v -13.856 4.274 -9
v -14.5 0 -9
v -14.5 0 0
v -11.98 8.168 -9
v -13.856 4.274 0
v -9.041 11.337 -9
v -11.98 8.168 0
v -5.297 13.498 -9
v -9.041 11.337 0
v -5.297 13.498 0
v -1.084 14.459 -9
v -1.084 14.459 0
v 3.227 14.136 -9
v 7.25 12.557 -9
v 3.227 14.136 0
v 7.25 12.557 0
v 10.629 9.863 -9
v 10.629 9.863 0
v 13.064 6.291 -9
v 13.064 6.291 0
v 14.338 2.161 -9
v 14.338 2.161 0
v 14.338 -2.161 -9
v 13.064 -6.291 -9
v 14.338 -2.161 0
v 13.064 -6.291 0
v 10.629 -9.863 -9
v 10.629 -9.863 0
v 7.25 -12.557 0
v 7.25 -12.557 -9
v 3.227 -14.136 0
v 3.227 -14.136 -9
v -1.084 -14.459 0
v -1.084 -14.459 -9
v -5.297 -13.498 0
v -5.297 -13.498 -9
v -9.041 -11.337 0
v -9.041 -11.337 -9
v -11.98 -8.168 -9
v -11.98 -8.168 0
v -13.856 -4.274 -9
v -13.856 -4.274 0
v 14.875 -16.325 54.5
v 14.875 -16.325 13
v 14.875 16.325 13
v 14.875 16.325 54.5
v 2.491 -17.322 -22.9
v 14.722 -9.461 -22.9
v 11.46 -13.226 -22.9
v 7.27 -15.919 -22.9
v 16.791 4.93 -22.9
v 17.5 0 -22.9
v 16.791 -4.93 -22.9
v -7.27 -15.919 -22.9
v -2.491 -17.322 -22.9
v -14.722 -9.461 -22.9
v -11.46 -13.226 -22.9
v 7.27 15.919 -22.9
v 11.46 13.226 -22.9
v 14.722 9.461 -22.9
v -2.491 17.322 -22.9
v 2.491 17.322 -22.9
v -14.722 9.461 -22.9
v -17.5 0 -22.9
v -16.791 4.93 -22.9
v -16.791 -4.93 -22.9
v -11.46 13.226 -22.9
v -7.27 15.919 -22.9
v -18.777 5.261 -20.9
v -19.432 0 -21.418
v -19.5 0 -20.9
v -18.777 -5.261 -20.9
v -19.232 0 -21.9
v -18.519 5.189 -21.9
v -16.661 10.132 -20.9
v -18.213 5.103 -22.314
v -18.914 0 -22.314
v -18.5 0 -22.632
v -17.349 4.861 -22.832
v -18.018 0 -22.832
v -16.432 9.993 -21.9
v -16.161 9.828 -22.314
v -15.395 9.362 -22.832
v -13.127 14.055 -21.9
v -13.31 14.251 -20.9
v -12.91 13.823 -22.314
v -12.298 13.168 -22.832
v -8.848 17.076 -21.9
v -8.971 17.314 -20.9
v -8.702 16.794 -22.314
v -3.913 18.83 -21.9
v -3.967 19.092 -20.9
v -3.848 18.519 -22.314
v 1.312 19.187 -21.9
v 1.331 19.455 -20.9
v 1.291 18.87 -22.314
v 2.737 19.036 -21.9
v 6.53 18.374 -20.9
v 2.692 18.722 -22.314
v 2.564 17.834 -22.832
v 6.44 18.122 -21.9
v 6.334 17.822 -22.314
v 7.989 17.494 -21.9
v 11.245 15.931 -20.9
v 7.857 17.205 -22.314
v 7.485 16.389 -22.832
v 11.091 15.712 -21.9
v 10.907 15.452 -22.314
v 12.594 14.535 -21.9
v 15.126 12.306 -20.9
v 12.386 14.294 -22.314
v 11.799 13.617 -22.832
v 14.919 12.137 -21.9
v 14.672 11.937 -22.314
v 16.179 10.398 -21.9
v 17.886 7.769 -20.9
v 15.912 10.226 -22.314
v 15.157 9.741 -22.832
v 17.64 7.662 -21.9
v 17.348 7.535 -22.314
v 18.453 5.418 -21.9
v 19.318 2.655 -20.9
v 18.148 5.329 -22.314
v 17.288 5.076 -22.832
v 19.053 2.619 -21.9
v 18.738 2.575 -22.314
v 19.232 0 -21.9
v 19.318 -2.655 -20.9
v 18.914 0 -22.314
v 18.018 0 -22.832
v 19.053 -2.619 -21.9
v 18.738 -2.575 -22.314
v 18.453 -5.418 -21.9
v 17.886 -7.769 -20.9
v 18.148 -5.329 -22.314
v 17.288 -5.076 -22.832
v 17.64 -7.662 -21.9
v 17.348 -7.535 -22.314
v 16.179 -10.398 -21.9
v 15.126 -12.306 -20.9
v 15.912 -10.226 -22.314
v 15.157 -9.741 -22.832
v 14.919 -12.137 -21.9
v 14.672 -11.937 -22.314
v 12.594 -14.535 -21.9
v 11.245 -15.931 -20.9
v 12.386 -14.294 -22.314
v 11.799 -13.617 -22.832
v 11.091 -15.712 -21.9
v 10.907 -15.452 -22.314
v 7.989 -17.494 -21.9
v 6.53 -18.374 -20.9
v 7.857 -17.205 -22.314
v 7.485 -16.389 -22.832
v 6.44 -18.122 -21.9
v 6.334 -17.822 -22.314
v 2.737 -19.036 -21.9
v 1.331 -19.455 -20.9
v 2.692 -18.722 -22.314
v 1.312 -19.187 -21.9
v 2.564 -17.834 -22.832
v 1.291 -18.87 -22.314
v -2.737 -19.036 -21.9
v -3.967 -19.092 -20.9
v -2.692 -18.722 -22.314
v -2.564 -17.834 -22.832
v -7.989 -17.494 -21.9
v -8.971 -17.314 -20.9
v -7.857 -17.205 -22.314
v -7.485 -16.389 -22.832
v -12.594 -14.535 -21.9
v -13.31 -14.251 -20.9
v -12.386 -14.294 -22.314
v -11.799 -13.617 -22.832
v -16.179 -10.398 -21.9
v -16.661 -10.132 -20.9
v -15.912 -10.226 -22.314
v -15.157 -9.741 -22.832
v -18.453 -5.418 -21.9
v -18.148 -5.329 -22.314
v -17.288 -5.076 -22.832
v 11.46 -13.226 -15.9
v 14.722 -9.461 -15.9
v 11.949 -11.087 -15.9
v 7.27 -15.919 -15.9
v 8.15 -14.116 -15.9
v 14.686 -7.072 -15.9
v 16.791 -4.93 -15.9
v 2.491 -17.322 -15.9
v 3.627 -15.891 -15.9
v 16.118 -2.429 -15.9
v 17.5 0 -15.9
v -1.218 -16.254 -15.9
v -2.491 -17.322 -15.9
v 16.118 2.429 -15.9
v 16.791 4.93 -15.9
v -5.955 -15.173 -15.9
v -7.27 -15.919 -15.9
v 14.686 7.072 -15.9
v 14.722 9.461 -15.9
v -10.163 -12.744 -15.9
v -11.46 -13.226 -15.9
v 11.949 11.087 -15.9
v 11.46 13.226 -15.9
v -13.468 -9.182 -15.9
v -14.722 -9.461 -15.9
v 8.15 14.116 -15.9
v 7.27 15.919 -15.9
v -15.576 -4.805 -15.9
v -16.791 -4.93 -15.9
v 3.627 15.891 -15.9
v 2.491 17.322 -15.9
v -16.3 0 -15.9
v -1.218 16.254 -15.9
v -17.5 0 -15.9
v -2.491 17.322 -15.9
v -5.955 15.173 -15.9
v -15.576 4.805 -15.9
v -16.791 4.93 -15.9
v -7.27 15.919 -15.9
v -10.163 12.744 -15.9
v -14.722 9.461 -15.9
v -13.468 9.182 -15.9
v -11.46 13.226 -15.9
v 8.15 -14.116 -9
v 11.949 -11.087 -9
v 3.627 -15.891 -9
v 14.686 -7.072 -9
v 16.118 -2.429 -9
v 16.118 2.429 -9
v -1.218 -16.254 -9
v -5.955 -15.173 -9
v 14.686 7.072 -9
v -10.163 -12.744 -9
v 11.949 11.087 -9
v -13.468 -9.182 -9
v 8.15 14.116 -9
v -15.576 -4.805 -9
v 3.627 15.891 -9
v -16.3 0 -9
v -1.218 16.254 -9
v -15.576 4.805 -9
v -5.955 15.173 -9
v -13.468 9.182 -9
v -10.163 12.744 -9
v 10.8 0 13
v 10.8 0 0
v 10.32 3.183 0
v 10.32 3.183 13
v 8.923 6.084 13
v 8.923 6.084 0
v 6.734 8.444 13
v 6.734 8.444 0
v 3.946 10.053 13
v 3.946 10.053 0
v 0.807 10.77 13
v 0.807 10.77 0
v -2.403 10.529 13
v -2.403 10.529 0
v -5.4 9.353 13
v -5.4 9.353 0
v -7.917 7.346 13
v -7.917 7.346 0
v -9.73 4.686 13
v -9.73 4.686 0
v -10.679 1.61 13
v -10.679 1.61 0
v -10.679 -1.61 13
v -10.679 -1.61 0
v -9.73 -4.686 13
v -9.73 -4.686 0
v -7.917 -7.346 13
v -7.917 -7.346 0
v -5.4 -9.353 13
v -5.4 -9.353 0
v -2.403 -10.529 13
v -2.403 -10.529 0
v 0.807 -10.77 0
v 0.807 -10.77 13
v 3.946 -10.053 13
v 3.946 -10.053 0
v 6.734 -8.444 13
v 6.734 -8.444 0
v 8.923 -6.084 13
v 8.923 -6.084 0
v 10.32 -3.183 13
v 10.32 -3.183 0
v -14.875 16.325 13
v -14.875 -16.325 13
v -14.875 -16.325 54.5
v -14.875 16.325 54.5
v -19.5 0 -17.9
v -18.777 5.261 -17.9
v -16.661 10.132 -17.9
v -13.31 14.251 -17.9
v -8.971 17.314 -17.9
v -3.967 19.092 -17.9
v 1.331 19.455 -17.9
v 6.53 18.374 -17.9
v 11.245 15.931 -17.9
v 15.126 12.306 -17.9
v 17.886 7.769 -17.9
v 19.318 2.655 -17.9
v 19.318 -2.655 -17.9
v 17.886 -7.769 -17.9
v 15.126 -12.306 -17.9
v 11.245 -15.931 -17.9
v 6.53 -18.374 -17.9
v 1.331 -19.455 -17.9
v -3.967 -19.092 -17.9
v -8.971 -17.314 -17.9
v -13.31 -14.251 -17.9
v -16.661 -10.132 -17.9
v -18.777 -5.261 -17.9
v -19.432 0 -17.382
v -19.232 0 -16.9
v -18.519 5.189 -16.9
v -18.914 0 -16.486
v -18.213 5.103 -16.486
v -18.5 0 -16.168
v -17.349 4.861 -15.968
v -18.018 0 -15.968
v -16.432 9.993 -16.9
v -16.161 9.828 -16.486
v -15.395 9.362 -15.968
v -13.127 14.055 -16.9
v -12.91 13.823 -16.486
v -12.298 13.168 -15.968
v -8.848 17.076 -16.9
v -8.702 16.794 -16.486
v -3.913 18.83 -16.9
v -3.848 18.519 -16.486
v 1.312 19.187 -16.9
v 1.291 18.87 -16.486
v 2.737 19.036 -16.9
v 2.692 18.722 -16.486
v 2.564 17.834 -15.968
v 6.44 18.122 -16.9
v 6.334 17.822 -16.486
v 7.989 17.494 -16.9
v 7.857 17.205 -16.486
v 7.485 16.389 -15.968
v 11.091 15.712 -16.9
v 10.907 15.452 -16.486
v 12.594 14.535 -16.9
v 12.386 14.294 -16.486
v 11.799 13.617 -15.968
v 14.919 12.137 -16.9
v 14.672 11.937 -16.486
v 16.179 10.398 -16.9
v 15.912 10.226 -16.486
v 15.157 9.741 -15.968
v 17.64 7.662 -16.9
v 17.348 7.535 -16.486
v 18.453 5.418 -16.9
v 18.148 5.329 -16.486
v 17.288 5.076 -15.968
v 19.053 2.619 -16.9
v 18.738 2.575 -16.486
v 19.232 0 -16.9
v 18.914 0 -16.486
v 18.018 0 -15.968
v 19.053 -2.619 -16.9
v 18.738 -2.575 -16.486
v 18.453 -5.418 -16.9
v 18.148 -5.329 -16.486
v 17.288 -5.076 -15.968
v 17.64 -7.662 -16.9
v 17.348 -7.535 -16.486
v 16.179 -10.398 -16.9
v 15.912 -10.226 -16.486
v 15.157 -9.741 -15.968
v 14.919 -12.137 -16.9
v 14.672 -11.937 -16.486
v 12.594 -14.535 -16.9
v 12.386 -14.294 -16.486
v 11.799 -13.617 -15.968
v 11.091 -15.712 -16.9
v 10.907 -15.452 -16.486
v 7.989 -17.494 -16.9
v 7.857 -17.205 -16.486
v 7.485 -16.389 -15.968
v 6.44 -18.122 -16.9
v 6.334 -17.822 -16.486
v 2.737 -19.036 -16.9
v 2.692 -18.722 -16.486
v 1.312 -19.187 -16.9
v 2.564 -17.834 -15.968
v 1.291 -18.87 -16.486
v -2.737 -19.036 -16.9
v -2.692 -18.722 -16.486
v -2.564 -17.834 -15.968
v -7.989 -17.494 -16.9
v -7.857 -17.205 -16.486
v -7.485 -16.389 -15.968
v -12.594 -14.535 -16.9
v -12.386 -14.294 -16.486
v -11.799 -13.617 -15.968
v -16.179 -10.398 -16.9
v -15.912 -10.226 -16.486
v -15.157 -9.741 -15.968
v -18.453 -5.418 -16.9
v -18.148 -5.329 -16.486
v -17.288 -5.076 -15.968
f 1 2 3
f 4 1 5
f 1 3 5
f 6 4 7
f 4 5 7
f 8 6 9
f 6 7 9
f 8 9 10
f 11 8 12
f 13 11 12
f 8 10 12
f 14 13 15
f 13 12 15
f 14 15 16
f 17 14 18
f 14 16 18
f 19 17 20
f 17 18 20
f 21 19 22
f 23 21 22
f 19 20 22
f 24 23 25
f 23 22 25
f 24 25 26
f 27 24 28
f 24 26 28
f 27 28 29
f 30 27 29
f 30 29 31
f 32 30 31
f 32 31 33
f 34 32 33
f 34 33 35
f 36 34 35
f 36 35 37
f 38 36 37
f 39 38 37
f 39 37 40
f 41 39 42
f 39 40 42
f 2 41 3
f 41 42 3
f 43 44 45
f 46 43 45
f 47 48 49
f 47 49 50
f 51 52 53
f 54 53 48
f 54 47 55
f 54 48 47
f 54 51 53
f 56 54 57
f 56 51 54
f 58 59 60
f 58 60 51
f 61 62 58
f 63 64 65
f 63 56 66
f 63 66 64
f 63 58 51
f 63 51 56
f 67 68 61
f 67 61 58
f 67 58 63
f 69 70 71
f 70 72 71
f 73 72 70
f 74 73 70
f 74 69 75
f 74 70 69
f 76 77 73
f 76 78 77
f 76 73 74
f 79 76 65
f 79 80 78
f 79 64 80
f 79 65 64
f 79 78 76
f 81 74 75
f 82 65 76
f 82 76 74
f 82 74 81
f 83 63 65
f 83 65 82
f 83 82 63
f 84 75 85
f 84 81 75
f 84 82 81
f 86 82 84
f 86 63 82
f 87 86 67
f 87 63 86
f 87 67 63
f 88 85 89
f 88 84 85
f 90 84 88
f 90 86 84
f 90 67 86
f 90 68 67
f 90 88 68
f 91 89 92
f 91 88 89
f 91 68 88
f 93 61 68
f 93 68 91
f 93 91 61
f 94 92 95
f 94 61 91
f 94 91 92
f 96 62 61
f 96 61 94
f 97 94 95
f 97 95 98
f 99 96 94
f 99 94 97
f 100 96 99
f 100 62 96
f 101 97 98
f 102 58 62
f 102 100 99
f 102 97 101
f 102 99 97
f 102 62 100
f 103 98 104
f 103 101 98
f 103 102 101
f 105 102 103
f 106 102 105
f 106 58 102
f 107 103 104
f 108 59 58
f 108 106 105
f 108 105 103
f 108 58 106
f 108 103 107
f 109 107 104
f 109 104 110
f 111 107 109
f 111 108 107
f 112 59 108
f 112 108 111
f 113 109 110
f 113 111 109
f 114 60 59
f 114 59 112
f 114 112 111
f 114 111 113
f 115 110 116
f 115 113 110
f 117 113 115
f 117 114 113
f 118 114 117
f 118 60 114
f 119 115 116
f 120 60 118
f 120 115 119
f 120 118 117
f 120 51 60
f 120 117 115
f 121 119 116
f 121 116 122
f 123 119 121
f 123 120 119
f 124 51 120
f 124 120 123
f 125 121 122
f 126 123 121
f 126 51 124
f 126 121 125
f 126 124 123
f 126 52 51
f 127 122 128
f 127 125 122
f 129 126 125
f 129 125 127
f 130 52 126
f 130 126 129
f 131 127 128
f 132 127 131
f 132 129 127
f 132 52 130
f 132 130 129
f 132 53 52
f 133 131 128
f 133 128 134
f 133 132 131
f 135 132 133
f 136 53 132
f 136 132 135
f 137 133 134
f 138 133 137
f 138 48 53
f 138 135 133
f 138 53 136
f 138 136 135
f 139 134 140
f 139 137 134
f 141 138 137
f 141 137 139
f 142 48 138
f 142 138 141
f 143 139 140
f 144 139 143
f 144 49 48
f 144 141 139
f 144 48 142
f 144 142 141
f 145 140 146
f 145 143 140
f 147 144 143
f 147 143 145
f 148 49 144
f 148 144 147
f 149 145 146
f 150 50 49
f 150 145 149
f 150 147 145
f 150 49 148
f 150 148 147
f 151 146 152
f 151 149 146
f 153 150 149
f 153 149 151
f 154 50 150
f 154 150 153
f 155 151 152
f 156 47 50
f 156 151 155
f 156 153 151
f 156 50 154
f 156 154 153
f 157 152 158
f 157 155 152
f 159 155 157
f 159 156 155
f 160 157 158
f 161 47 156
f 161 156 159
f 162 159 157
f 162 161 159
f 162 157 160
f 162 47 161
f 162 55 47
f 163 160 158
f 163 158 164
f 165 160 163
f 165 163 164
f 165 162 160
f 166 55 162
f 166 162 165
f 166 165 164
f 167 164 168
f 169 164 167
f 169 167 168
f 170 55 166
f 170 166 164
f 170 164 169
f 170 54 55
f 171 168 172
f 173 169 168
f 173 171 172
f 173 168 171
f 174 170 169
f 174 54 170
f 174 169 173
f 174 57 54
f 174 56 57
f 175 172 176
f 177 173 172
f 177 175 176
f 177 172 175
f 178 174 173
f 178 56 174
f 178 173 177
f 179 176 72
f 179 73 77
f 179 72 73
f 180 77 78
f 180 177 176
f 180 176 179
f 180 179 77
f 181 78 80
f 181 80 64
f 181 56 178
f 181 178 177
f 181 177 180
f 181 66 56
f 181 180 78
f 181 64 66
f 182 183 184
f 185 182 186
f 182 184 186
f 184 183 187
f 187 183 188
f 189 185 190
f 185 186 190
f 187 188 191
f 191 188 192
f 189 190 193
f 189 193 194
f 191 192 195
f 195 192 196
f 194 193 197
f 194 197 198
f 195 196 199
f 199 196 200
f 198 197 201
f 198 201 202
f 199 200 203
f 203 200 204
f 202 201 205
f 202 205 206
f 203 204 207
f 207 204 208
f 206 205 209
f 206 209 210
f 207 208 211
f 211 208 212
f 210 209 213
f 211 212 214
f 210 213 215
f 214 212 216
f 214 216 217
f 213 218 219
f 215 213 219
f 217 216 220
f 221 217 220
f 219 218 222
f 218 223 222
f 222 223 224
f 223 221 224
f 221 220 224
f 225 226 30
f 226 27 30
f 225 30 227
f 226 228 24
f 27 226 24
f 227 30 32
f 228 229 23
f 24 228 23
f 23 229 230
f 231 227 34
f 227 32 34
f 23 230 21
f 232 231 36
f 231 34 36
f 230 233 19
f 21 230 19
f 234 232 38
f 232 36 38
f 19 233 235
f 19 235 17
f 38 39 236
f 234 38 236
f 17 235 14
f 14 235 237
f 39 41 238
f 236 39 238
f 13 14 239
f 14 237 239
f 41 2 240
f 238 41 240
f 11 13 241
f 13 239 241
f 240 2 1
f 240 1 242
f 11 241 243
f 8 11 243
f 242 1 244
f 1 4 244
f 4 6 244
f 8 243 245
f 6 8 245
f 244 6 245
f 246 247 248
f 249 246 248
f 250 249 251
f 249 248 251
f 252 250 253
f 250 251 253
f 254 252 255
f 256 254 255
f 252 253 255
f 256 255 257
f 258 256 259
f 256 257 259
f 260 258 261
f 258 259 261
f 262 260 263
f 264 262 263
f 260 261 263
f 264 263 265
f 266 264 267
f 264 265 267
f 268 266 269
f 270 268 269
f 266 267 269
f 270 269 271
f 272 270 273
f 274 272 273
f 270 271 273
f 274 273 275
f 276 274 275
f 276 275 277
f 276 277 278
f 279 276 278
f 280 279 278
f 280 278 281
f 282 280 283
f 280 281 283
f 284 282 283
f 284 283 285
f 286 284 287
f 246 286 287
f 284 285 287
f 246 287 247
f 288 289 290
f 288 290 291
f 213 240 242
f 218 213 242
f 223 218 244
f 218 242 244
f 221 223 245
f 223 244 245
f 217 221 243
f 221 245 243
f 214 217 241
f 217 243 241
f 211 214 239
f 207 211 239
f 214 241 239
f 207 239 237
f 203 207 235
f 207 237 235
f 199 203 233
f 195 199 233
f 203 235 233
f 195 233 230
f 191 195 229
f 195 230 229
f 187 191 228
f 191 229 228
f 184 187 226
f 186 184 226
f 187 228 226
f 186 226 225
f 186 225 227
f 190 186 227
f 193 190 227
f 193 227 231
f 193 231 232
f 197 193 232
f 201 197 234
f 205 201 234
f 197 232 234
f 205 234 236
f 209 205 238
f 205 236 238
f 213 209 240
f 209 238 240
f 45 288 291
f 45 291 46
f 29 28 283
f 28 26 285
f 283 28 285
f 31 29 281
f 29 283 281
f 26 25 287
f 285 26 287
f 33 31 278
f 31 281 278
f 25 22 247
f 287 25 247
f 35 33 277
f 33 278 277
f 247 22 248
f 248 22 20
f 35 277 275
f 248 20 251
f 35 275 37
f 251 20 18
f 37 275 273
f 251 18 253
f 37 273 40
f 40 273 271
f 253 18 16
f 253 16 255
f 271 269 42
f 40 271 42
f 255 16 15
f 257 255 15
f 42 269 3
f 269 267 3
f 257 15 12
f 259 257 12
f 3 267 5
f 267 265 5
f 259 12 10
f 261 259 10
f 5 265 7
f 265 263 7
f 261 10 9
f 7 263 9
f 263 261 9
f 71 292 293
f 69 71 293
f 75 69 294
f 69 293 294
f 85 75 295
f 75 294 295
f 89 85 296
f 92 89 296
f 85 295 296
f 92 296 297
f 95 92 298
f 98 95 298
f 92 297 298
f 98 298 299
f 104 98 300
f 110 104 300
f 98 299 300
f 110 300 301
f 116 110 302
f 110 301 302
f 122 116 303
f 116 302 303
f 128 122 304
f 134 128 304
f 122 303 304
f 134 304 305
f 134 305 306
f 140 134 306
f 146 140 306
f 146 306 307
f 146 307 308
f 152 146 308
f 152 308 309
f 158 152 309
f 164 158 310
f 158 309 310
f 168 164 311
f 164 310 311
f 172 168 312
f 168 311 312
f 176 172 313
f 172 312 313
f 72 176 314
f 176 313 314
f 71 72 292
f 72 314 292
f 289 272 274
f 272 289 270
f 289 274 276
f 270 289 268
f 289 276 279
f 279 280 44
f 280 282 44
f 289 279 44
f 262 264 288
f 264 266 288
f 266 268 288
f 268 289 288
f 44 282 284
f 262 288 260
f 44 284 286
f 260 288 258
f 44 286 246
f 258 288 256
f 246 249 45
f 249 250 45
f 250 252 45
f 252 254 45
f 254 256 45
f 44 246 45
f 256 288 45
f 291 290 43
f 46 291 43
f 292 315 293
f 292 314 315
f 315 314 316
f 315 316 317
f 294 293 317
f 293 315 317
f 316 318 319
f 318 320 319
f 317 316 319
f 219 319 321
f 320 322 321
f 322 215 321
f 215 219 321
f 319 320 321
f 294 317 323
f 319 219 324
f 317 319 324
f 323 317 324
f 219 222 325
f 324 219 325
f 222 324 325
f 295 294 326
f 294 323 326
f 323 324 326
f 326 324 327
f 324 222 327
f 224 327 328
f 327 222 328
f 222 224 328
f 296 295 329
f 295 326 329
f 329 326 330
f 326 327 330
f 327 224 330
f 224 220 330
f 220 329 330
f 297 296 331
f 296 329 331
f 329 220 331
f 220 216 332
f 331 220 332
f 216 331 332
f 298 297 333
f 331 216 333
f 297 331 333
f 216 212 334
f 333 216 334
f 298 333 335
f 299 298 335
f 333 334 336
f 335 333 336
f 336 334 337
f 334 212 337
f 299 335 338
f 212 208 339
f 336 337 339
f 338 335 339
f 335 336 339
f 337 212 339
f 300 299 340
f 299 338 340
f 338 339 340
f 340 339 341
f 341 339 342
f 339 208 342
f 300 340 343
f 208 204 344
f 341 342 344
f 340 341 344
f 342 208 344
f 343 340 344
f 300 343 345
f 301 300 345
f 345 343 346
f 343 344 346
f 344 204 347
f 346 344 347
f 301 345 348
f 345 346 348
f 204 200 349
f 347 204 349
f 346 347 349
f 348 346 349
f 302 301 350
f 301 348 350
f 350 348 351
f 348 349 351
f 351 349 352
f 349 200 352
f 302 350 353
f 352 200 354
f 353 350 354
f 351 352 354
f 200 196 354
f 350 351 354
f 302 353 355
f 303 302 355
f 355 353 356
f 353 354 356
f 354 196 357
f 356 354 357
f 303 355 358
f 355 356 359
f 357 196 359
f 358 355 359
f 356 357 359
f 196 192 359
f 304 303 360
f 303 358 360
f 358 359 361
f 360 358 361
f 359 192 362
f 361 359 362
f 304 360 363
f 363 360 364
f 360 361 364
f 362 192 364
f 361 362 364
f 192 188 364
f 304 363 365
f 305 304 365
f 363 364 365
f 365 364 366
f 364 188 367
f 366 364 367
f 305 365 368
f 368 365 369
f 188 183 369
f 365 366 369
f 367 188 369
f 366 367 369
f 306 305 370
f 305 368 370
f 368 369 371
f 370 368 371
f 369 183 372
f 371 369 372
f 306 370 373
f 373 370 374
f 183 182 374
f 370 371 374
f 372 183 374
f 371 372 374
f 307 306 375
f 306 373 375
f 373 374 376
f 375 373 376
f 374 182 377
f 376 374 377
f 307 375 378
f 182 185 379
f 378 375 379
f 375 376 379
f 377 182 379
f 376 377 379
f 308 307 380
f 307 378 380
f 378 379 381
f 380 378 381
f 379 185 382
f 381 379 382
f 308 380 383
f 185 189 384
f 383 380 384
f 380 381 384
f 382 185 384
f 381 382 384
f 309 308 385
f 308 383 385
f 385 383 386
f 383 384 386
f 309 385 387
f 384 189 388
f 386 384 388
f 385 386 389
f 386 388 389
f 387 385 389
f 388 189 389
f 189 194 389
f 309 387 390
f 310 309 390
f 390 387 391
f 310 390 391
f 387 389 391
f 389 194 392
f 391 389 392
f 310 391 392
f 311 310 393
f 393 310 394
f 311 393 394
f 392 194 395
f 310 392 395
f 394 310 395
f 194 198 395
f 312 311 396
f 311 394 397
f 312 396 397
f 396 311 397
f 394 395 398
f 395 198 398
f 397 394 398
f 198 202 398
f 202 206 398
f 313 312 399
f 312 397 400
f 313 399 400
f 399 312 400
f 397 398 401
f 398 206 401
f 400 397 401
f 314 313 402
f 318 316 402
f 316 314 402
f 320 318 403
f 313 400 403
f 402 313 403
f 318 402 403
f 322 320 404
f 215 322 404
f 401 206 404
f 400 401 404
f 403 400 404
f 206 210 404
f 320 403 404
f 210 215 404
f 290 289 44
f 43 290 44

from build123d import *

# Parameters (mm, degrees)
SKETCH1_R           = 10.8
BOSS_EXTRUDE1_DEPTH = 13
SKETCH2_R           = 14.5
BOSS_EXTRUDE2_DEPTH = 9
SKETCH3_R           = 16.3
BOSS_EXTRUDE3_DEPTH = 6.9
SKETCH4_R           = 19.5
BOSS_EXTRUDE4_DEPTH = 7
FILLET1_R           = 2
SKETCH5_W           = 29.75
SKETCH5_H           = 32.65
BOSS_EXTRUDE5_DEPTH = 41.5


with BuildPart() as part:
    # Sketch1 → Boss-Extrude1 (new body)
    with BuildSketch(Plane.XY):
        Circle(SKETCH1_R)
    extrude(amount=BOSS_EXTRUDE1_DEPTH)

    # Sketch2 → Boss-Extrude2 (add)
    with BuildSketch(Plane(origin=(0, 0, 0), x_dir=(-1, 0, 0), z_dir=(0, 0, -1))):
        Circle(SKETCH2_R)
    extrude(amount=BOSS_EXTRUDE2_DEPTH)

    # Sketch3 → Boss-Extrude3 (add)
    with BuildSketch(Plane(origin=(0, 0, -9), x_dir=(-1, 0, 0), z_dir=(0, 0, -1))):
        Circle(SKETCH3_R)
    extrude(amount=BOSS_EXTRUDE3_DEPTH)

    # Sketch4 → Boss-Extrude4 (add)
    with BuildSketch(Plane(origin=(0, 0, -15.9), x_dir=(-1, 0, 0), z_dir=(0, 0, -1))):
        Circle(SKETCH4_R)
    extrude(amount=BOSS_EXTRUDE4_DEPTH)

    # Fillet1
    fillet1_edges = [part.edges().sort_by_distance(p)[0] for p in [
        (19.5, 0, -15.9),
        (19.5, 0, -22.9),
    ]]
    fillet(fillet1_edges, radius=FILLET1_R)

    # Sketch5 → Boss-Extrude5 (add)
    with BuildSketch(Plane.XY.offset(13)):
        Rectangle(SKETCH5_W, SKETCH5_H)
    extrude(amount=BOSS_EXTRUDE5_DEPTH)


solid = part.part
